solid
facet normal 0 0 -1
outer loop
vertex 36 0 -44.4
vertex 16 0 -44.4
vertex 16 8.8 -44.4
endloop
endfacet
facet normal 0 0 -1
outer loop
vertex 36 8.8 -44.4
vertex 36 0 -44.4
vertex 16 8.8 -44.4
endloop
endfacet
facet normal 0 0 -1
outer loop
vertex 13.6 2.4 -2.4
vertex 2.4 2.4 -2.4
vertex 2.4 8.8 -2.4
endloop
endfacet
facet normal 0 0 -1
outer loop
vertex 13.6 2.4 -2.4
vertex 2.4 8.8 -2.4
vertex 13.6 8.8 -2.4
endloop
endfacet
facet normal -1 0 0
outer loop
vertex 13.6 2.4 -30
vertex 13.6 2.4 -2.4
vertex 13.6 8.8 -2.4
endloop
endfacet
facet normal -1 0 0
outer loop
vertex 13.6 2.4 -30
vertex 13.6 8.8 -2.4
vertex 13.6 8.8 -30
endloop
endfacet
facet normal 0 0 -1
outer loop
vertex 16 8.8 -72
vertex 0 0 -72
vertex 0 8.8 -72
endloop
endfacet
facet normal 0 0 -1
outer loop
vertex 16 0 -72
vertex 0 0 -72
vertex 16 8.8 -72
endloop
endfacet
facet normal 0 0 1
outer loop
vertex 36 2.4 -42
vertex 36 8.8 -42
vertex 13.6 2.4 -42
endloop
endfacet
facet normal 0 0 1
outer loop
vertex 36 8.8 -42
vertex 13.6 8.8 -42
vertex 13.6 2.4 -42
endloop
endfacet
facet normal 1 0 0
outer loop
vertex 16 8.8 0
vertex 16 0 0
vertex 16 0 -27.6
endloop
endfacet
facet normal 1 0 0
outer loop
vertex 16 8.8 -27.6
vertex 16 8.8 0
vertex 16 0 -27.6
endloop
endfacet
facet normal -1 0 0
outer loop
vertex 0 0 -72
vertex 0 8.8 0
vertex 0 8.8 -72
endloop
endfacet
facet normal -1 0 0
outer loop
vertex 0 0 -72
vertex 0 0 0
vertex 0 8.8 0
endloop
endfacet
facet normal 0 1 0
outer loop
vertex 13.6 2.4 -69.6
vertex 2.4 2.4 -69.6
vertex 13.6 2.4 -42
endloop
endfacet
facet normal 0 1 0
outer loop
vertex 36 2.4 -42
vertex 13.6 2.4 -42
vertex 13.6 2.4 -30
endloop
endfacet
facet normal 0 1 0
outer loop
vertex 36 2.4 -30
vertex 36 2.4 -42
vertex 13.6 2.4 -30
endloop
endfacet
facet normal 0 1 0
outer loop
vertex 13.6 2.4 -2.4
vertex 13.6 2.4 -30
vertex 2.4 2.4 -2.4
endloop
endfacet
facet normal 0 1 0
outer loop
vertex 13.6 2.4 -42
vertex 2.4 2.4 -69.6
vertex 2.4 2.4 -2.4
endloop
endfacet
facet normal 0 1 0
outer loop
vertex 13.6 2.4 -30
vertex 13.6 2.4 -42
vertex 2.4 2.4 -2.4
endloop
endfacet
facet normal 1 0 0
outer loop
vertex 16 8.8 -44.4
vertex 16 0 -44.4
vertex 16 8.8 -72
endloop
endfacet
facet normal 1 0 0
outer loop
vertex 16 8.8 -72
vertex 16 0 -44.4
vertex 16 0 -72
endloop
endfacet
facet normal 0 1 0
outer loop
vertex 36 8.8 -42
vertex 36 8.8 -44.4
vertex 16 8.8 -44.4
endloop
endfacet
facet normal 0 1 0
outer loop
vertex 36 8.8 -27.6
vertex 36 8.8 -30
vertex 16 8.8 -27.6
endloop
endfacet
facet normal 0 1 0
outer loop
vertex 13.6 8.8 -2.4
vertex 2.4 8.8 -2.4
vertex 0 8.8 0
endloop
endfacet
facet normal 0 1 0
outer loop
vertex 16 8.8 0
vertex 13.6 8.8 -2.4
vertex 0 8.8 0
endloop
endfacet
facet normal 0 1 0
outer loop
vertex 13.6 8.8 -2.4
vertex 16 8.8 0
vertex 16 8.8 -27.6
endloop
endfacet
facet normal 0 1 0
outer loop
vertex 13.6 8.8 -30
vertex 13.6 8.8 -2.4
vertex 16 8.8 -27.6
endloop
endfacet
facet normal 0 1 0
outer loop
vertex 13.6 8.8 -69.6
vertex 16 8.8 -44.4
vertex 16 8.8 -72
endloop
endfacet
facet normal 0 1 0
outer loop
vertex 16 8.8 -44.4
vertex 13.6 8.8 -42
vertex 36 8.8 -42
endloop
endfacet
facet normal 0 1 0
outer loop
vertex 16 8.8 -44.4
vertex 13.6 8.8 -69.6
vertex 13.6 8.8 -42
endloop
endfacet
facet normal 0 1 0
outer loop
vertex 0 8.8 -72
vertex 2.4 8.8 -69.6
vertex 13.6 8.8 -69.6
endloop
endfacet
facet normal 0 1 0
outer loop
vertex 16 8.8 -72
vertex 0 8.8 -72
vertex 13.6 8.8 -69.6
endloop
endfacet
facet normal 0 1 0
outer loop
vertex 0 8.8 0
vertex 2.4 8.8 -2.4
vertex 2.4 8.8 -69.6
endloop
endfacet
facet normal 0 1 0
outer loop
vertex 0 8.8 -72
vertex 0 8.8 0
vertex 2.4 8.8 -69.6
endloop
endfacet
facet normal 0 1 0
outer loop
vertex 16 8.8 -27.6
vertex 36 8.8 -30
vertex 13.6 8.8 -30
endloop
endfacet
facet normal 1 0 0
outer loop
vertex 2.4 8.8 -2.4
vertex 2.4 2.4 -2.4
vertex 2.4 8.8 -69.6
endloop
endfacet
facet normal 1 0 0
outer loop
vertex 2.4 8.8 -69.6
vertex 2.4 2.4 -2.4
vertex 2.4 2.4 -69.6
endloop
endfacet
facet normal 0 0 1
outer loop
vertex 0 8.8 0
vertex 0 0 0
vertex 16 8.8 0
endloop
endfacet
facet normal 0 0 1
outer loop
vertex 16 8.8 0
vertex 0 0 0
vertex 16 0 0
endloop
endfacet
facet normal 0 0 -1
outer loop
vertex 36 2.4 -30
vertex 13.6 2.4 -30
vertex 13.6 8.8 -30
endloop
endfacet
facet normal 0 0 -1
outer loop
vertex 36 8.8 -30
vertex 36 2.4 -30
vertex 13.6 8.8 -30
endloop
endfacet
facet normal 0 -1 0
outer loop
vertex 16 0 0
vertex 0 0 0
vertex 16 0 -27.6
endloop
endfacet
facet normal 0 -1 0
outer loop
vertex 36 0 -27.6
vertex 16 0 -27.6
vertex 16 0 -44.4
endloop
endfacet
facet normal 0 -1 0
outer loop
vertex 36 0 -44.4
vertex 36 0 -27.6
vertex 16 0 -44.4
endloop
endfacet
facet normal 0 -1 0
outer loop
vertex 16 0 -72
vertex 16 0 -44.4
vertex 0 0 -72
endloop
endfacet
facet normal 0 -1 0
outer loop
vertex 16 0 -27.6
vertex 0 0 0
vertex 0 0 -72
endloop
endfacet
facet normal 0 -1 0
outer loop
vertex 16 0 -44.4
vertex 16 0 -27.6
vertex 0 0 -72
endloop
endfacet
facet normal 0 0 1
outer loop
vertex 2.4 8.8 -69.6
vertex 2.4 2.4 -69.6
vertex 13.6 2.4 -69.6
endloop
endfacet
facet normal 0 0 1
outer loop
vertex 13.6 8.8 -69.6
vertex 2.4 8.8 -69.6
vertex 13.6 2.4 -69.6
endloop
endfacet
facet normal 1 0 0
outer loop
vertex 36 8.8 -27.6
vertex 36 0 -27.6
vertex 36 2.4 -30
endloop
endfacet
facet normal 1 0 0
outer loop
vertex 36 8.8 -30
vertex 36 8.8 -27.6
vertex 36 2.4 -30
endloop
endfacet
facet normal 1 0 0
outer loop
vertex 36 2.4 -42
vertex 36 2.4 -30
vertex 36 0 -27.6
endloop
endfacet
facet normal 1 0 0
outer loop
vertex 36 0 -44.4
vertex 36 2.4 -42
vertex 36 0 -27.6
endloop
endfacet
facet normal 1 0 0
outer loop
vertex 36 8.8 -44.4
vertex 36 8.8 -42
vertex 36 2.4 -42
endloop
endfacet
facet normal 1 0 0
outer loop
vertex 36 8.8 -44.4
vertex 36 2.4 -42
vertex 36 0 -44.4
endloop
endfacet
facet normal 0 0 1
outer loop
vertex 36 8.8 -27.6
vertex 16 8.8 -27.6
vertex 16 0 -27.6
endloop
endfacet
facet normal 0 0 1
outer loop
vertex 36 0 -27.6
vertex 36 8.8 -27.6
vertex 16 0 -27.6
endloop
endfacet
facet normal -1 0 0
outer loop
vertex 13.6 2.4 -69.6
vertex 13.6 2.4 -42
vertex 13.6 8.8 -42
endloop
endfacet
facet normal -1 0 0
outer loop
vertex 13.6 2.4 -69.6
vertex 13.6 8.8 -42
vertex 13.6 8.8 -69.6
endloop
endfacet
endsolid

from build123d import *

# Parameters (mm, degrees)
SKETCH1_W           = 16
SKETCH1_H           = 72
BOSS_EXTRUDE1_DEPTH = 2.4
SKETCH2_W           = 16
SKETCH2_H           = 72
SKETCH2_W_2         = 11.2
SKETCH2_H_2         = 67.2
BOSS_EXTRUDE2_DEPTH = 6.4
SKETCH3_W           = 12
SKETCH3_H           = 6.4
CUT_EXTRUDE1_DEPTH  = 4.8
BOSS_EXTRUDE3_DEPTH = 20


with BuildPart() as part:
    # Sketch1 → Boss-Extrude1 (new body)
    with BuildSketch(Plane(origin=(0, 0, 0), x_dir=(1, 0, 0), z_dir=(0, 1, 0))):
        with Locations((8, 36)):
            Rectangle(SKETCH1_W, SKETCH1_H)
    extrude(amount=BOSS_EXTRUDE1_DEPTH)

    # Sketch2 → Boss-Extrude2 (add)
    with BuildSketch(Plane(origin=(0, 2.4, 0), x_dir=(1, 0, 0), z_dir=(0, 1, 0))):
        with Locations((8, 36)):
            Rectangle(SKETCH2_W, SKETCH2_H)
        with Locations((8, 36)):
            Rectangle(SKETCH2_W_2, SKETCH2_H_2, mode=Mode.SUBTRACT)
    extrude(amount=BOSS_EXTRUDE2_DEPTH)

    # Sketch3 → Cut-Extrude1 (cut)
    with BuildSketch(Plane(origin=(16, 0, 0), x_dir=(0, 0, -1), z_dir=(1, 0, 0))):
        with Locations((36, 5.6)):
            Rectangle(SKETCH3_W, SKETCH3_H)
    extrude(amount=-CUT_EXTRUDE1_DEPTH, mode=Mode.SUBTRACT)

    # Sketch4 → Boss-Extrude3 (add)
    with BuildSketch(Plane(origin=(16, 0, 0), x_dir=(0, 0, -1), z_dir=(1, 0, 0))):
        Polygon((30, 2.4), (30, 8.8), (27.6, 8.8), (27.6, 0), (44.4, 0), (44.4, 8.8), (42, 8.8), (42, 2.4), align=None)
    extrude(amount=BOSS_EXTRUDE3_DEPTH)


solid = part.part
